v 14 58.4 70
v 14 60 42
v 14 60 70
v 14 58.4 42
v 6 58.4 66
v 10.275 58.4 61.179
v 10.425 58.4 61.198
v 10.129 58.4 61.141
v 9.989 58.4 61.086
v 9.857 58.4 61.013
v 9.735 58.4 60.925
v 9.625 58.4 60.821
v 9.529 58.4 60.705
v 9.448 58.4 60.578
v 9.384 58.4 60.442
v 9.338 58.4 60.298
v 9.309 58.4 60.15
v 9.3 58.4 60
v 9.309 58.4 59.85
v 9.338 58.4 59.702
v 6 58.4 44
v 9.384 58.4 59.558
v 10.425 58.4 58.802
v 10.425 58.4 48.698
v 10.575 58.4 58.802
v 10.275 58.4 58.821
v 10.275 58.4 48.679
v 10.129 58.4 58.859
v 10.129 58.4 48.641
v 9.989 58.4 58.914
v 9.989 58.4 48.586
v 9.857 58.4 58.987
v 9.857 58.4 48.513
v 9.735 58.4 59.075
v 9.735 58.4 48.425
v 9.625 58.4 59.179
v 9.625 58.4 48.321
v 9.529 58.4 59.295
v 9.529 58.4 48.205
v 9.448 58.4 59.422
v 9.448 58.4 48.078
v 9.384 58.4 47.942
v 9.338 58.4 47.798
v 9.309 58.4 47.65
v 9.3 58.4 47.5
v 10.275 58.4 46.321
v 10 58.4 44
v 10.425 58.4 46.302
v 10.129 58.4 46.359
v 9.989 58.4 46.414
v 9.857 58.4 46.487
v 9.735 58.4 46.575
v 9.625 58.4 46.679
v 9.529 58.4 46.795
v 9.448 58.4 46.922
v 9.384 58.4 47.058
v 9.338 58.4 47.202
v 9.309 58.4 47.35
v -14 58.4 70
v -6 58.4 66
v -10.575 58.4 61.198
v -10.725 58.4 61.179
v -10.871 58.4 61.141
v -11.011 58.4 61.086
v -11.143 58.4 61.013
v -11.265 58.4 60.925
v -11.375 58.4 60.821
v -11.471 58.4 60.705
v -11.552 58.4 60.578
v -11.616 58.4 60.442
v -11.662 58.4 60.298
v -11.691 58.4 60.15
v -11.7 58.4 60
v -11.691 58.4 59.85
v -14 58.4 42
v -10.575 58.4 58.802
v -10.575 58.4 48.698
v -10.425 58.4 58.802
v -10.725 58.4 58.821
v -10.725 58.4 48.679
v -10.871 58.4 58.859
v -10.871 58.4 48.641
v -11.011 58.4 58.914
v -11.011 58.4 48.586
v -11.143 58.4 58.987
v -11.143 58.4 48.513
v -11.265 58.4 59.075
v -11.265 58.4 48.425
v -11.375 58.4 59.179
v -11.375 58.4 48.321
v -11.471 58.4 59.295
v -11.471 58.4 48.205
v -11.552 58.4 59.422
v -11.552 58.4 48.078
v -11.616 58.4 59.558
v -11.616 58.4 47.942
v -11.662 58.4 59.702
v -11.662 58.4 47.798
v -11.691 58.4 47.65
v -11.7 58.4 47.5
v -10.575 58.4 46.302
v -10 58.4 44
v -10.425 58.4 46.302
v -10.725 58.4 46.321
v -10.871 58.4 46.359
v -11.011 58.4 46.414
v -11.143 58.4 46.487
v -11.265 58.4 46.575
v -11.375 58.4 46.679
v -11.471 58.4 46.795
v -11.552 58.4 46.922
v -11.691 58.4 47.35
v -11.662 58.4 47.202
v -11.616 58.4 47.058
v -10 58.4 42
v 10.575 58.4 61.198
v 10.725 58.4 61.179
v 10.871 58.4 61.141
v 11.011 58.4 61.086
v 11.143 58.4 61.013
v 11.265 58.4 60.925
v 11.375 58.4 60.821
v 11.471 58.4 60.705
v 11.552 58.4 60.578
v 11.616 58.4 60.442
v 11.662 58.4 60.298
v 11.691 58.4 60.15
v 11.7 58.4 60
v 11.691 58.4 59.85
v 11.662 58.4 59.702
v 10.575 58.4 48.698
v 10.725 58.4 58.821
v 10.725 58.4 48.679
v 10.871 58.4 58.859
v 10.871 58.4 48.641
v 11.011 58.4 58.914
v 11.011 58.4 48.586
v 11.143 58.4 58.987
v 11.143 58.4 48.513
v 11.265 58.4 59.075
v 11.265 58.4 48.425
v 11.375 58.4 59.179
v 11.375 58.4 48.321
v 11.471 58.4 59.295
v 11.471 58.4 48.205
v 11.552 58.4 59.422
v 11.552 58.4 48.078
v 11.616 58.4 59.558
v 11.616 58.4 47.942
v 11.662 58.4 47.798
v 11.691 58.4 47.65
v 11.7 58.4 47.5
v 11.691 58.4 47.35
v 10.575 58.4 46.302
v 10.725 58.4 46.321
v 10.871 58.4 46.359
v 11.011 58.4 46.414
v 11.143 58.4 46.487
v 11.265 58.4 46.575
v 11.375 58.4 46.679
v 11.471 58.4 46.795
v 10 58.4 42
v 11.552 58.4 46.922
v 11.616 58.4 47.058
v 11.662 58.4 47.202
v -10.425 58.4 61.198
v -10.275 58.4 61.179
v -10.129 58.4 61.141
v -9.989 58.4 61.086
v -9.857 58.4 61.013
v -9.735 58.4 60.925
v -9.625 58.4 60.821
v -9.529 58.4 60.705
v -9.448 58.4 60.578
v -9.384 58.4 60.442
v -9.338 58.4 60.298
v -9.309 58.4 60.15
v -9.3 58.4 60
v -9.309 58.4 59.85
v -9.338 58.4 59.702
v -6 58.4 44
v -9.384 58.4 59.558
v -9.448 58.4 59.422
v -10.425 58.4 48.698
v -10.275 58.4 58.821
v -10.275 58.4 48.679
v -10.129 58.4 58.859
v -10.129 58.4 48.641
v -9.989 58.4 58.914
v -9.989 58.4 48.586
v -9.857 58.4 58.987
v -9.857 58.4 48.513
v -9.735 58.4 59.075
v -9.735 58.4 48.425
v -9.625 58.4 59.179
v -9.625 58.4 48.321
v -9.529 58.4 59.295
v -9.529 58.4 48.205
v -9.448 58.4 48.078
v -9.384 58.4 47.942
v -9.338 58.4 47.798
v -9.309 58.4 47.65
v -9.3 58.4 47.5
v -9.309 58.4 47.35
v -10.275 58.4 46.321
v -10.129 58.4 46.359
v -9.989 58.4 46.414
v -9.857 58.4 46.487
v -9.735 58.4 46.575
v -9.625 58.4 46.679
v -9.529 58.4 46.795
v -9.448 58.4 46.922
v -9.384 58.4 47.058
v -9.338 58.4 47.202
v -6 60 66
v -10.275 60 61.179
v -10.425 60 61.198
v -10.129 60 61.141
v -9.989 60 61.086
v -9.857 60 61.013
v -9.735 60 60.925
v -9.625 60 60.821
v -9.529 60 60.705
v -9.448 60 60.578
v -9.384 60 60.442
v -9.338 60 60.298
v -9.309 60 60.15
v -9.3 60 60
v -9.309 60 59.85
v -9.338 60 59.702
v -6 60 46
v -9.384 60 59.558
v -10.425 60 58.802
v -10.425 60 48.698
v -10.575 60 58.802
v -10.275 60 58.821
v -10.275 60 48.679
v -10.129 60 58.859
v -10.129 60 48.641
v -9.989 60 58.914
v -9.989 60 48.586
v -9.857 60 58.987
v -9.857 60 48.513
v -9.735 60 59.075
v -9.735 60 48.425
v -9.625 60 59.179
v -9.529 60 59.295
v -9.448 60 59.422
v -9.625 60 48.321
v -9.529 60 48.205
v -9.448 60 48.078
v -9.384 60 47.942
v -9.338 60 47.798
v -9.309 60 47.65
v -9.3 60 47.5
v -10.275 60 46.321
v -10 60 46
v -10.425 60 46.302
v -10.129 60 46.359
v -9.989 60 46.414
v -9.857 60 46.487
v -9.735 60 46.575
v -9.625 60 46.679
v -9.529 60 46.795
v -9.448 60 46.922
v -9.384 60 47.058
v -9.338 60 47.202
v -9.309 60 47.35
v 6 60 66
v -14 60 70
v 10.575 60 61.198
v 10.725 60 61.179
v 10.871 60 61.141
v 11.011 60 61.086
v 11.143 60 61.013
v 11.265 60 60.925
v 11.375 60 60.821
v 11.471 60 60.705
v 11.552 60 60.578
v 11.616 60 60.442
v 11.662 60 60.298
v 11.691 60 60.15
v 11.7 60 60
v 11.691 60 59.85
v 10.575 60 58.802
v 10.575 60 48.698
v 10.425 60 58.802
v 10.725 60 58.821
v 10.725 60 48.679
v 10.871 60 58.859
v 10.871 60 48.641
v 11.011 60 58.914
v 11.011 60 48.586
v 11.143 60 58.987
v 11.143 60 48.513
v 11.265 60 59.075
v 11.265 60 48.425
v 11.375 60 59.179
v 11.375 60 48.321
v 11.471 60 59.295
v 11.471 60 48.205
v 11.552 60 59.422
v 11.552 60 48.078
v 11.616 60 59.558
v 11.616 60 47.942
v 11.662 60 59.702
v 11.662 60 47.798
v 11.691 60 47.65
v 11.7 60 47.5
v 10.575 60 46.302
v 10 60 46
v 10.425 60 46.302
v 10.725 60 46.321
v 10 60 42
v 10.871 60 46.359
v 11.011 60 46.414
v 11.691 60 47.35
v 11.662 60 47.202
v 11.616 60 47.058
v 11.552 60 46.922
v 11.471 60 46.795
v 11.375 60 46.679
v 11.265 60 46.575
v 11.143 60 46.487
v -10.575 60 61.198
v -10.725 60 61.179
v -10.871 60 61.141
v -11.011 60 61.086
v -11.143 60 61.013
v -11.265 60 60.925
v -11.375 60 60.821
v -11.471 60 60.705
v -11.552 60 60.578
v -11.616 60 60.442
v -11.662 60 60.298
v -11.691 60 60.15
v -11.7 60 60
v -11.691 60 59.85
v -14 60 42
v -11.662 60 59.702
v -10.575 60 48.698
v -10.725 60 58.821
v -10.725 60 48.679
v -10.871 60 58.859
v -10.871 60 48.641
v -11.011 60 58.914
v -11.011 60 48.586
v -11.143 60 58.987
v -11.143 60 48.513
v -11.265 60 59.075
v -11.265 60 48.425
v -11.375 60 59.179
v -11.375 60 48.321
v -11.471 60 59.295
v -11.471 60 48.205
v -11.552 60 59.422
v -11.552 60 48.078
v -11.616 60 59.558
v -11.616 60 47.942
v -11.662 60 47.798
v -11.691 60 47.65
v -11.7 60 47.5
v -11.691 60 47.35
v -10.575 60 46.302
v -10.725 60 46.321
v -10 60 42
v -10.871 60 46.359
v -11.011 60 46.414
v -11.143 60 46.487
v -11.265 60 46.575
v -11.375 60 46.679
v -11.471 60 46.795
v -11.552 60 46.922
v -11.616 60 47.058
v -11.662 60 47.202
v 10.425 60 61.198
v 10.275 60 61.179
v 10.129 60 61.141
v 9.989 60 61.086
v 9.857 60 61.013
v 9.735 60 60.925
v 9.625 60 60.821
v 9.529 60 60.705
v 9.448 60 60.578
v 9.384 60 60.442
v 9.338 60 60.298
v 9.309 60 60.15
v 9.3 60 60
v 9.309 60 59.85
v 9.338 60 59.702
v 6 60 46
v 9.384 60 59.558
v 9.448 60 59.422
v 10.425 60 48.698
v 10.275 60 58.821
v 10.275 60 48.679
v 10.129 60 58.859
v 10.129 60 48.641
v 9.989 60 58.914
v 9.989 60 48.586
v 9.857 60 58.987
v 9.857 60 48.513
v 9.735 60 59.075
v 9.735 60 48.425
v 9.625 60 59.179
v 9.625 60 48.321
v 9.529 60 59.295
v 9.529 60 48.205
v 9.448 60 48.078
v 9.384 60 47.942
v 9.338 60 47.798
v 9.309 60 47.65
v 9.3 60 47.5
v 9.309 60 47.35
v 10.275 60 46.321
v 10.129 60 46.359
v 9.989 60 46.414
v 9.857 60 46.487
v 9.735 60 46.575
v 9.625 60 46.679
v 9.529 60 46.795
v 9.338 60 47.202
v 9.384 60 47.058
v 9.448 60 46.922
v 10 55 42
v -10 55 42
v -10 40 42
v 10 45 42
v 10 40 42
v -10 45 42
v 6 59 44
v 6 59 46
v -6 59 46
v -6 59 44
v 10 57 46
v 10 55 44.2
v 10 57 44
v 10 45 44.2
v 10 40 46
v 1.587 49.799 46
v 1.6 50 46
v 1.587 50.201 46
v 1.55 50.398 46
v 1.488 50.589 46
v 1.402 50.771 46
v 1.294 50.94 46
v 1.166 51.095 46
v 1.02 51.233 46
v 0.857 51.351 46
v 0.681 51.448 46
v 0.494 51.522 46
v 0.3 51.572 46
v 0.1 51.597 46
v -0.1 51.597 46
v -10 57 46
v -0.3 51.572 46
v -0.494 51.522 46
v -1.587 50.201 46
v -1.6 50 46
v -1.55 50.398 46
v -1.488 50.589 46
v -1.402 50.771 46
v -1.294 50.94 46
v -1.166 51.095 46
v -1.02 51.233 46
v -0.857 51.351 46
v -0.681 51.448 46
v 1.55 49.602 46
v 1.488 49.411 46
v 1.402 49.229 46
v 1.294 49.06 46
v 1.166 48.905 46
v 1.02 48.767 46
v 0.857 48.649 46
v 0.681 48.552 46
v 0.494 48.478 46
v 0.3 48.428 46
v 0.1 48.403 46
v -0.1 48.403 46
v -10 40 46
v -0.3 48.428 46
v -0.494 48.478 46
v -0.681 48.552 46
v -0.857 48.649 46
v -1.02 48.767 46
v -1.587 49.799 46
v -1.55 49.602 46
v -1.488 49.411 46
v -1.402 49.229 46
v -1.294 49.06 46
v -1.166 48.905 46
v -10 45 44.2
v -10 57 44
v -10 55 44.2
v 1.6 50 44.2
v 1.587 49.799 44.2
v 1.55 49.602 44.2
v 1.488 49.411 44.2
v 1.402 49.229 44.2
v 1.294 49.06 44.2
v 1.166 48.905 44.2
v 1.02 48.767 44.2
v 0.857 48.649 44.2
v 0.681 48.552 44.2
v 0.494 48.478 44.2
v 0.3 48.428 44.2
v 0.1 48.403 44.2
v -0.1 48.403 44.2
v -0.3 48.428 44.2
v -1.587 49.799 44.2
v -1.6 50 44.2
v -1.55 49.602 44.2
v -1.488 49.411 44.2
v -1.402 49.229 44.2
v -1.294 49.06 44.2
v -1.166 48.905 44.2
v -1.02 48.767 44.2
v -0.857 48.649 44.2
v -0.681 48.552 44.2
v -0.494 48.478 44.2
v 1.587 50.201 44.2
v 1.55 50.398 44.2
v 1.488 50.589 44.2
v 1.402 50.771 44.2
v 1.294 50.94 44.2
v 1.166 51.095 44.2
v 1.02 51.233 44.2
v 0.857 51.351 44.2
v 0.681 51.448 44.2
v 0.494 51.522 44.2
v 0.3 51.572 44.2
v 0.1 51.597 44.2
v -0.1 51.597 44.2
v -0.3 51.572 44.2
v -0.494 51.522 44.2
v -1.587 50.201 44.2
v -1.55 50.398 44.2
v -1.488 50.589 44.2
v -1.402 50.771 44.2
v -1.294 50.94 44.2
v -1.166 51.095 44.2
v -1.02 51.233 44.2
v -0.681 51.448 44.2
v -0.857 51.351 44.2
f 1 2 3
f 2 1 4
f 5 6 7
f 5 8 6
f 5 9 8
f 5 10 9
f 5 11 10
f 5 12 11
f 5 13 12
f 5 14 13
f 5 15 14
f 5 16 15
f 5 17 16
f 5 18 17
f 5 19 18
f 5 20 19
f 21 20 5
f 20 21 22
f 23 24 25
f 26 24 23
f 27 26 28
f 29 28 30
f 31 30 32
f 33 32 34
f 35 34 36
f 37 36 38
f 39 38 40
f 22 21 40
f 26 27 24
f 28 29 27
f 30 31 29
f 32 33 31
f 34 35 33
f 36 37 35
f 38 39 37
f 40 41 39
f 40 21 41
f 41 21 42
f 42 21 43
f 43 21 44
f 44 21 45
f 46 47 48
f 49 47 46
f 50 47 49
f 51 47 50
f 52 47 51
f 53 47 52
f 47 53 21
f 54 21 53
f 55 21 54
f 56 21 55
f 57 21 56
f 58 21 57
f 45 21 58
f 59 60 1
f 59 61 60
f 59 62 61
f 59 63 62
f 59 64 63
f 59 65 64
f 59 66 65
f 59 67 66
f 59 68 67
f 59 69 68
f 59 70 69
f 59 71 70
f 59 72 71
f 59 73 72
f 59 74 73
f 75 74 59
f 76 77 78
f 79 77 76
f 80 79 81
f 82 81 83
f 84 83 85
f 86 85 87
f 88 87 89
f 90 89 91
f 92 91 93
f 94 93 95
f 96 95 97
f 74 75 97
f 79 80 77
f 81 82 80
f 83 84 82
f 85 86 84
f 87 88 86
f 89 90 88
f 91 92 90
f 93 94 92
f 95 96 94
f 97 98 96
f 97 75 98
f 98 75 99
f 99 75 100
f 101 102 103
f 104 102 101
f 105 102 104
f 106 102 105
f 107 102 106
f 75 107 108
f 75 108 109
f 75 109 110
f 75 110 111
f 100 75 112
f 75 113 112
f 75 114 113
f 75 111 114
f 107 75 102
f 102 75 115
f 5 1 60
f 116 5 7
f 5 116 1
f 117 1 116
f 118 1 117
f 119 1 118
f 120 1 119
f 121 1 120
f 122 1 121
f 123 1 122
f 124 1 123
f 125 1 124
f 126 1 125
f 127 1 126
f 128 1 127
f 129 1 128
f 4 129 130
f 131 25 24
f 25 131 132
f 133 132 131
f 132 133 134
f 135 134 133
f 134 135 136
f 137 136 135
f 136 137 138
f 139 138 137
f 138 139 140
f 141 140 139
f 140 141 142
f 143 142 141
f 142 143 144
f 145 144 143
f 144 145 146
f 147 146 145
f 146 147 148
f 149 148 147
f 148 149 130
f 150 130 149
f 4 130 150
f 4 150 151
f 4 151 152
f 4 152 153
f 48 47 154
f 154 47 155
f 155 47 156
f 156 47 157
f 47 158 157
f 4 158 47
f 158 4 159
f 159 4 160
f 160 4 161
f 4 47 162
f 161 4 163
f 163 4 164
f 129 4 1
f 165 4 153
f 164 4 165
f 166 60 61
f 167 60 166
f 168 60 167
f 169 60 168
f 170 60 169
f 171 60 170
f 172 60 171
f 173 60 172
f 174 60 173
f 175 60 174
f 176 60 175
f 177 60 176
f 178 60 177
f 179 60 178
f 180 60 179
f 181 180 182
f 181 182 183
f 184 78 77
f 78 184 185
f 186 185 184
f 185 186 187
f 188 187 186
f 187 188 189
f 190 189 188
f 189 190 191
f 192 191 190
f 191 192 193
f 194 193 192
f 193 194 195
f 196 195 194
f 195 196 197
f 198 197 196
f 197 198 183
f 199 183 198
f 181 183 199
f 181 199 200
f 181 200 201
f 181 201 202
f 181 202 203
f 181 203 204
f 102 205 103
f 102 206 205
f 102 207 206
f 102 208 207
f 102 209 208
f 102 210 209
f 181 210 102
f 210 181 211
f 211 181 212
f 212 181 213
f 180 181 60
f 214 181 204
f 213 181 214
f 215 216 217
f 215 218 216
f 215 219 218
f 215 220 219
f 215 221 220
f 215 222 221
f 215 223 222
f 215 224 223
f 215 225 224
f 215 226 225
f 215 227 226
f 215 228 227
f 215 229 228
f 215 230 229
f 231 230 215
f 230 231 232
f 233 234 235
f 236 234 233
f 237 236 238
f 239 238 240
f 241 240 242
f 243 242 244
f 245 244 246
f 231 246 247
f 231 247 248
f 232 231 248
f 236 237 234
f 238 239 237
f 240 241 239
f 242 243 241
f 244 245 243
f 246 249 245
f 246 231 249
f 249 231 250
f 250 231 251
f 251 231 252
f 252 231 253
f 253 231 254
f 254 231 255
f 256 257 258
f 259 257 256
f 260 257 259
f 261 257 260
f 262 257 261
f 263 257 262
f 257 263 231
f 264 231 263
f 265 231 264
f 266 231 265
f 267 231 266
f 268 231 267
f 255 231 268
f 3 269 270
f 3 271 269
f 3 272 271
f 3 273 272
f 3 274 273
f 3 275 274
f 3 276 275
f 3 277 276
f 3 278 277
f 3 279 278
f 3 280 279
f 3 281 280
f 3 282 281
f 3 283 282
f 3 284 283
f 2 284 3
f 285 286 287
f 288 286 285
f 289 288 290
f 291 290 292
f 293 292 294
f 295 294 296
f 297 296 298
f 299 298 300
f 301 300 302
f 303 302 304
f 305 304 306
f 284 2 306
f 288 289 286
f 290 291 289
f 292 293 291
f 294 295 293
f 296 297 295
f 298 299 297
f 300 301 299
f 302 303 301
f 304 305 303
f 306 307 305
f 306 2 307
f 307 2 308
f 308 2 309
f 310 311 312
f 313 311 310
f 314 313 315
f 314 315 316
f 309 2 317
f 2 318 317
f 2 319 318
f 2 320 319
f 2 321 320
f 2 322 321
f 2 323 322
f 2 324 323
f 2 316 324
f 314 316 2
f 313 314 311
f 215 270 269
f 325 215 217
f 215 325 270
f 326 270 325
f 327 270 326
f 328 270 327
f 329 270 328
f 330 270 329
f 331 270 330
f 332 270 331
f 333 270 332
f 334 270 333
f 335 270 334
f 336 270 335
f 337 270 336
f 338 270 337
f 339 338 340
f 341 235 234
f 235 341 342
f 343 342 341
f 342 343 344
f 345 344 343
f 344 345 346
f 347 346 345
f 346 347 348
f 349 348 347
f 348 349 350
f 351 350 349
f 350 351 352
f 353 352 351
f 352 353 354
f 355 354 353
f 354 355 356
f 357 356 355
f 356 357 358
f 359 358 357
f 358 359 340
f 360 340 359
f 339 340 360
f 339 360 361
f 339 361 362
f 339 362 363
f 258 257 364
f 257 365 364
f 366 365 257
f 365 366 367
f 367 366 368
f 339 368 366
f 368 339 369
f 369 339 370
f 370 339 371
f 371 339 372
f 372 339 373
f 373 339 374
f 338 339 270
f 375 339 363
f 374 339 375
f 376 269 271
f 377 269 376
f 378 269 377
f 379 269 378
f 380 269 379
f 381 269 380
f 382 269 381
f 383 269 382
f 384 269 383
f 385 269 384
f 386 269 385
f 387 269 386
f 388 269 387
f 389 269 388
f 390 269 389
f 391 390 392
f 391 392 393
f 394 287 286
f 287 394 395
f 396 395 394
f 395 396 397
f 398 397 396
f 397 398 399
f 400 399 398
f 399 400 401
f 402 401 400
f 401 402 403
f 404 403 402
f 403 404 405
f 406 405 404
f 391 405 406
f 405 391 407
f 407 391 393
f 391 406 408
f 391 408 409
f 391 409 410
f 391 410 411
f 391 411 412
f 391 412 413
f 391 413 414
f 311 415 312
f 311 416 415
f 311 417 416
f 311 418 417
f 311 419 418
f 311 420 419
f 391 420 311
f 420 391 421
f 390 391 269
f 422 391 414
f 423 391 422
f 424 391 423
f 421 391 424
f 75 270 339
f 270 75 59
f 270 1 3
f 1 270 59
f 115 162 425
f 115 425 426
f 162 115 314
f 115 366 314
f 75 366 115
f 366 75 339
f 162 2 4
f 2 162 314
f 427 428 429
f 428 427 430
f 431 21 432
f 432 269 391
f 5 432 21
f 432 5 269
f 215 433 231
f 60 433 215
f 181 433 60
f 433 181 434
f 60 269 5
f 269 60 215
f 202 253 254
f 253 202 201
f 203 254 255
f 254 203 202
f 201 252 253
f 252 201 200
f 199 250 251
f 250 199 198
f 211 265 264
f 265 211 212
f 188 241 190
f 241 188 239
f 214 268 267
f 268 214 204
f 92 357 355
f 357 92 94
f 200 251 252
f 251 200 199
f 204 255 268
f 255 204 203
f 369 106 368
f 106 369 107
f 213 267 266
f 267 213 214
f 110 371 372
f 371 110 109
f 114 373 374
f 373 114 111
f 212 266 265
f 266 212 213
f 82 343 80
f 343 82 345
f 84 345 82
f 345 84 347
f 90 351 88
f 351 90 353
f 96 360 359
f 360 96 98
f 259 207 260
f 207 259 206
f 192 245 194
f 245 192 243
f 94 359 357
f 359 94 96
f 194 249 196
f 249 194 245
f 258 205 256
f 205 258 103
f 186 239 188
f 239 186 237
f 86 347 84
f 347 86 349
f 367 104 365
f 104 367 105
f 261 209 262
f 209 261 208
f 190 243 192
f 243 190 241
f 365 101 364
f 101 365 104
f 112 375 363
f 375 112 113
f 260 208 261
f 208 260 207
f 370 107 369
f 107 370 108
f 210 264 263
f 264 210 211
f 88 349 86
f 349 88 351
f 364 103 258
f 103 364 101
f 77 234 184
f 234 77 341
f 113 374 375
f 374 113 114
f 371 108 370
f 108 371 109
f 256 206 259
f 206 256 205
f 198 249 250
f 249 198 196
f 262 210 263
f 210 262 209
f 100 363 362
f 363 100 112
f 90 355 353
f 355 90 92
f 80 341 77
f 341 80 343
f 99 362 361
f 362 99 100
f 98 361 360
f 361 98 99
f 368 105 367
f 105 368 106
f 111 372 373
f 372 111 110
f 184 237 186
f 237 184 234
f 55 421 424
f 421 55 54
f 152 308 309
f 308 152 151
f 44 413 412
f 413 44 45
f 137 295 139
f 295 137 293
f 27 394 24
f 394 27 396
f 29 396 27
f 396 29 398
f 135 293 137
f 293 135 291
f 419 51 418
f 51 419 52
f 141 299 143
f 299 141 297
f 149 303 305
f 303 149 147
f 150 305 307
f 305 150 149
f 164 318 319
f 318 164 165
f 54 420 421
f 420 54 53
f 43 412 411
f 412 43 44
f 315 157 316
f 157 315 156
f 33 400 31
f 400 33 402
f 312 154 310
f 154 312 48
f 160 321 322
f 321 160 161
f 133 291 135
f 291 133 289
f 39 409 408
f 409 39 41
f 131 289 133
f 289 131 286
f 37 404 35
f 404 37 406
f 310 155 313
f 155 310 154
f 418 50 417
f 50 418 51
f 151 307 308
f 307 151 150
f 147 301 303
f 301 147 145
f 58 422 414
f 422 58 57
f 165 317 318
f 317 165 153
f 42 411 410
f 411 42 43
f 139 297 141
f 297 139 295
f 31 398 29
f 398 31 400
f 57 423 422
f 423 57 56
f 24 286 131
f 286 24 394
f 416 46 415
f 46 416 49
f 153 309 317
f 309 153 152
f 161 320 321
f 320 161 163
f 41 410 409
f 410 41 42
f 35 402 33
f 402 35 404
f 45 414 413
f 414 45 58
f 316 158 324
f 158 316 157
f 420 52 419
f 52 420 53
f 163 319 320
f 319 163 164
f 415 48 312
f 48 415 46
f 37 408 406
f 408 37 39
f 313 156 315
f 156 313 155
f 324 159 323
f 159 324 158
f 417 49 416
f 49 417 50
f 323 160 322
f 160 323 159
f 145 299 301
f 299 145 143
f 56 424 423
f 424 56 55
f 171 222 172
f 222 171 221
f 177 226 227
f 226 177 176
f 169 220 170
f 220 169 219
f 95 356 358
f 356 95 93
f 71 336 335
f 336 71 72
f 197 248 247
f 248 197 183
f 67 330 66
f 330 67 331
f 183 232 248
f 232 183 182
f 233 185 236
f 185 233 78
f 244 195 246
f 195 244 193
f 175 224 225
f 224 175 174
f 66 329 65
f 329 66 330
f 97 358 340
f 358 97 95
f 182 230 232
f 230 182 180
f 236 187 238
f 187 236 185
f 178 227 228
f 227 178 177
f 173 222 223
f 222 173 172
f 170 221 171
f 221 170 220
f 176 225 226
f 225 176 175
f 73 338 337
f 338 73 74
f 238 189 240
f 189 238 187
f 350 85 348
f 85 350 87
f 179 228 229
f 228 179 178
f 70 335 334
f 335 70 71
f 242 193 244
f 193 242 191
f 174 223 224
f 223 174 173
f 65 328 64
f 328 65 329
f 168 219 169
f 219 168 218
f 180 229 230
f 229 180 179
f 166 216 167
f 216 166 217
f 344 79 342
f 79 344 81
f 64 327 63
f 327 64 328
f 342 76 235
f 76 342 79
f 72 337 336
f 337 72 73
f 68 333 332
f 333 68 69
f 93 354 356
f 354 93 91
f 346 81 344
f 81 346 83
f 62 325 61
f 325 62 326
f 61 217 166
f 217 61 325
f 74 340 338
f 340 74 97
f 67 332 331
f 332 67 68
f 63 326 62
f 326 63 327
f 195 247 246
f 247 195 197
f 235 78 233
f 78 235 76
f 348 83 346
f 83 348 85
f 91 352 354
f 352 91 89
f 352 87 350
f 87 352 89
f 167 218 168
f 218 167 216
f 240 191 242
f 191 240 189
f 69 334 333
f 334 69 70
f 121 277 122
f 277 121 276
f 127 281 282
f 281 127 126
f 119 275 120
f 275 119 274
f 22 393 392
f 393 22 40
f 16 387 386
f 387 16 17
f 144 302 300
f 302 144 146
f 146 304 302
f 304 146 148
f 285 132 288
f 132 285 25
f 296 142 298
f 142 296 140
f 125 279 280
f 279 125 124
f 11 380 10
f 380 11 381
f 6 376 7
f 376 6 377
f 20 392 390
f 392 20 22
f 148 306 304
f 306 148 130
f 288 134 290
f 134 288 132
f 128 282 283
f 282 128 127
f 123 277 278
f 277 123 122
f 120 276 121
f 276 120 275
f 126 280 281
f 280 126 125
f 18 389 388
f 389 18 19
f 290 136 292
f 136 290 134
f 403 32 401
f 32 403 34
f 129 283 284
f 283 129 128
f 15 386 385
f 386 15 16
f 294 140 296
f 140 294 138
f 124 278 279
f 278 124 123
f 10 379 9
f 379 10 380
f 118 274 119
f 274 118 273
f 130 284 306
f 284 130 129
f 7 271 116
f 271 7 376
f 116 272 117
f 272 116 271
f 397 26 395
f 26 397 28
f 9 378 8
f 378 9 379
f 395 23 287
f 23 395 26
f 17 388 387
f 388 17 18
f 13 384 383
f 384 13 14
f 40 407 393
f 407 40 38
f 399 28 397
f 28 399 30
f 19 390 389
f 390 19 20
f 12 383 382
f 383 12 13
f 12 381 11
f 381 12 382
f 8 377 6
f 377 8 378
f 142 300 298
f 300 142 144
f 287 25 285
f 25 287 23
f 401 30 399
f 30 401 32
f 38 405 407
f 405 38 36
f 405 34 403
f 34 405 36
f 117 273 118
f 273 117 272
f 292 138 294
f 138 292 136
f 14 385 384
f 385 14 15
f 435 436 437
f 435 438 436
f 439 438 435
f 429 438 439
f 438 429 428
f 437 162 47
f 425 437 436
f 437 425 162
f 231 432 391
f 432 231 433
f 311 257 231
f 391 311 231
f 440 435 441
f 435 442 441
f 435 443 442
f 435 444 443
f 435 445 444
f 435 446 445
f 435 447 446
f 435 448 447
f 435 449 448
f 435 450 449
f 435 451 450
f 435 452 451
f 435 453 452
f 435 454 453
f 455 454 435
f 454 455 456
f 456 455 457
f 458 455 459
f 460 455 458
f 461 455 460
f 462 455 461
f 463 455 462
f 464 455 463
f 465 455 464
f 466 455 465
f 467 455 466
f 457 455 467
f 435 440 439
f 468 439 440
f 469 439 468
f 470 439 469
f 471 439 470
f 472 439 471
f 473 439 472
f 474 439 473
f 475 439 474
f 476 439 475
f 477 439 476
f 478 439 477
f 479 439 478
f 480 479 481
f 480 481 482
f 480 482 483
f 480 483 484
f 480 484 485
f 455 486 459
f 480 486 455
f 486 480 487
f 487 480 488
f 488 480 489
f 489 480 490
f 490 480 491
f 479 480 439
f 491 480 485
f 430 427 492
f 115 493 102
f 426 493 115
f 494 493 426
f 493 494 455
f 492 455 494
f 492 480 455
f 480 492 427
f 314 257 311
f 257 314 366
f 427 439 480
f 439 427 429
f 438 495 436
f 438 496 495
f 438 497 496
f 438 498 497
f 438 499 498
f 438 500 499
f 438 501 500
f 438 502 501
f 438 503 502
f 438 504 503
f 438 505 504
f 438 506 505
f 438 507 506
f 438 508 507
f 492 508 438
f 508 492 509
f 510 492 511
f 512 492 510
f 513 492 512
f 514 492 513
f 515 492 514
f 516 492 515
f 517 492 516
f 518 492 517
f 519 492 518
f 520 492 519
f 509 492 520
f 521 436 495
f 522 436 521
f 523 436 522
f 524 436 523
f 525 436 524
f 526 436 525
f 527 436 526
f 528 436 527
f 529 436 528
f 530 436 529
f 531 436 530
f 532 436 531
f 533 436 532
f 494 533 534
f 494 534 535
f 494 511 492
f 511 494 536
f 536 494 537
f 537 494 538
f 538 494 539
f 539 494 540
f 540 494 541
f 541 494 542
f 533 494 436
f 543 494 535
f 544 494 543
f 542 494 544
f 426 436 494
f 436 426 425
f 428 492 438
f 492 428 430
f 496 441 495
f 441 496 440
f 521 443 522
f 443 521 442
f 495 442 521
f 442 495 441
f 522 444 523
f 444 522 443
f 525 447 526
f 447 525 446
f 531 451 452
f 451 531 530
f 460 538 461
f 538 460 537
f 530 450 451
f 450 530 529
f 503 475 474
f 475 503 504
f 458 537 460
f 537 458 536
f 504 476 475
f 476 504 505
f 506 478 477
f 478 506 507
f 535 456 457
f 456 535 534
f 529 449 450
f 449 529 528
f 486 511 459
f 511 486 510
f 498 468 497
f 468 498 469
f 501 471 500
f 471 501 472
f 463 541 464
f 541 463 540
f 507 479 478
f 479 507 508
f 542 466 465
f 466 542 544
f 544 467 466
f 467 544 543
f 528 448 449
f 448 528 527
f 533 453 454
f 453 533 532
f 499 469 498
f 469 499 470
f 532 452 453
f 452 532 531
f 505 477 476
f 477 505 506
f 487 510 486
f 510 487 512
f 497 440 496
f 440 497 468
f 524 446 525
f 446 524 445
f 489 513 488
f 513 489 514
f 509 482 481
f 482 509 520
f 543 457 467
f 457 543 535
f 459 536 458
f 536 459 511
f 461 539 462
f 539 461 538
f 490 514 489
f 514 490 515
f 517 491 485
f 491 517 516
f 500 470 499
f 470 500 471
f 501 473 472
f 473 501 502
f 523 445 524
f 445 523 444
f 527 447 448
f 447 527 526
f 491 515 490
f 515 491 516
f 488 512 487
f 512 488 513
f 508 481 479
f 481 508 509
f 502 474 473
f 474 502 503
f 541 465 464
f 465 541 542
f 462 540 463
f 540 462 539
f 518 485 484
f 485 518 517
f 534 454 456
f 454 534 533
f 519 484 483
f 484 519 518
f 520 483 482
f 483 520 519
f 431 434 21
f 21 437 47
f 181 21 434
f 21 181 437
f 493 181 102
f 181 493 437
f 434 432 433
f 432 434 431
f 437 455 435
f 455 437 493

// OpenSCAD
module screwhelper(rout, rin, height)
{
    difference(){
        translate([0,0,height/2])cylinder(height, r=rout,center=true,$fn=50);
        translate([0,0,height/2])cylinder(height+0.01, r=rin,center=true,$fn=50);
    }
}

module conn40_one(){
    /*
    difference(){
    translate([0, 0, 0])screwhelper(5, 1.6, 40-4);
    translate([0, 0, 40-4-1])cylinder(2.01, r=4,center=true,$fn=50);
    translate([0, 0, 1])cylinder(2.01, r=4,center=true,$fn=50);
    }
    */
    
    translate([0, 0, 36-2])screwhelper(5, 4, 2);
    difference(){
        hull(){
        translate([0, 0, 36-2])cylinder(0.01, r=5,center=true,$fn=50);
        translate([0, 0, 36-4])cylinder(0.01, r=3,center=true,$fn=50);
        }
        cylinder(99, r=1.6,center=true,$fn=50);
    }
    
    translate([0, 0, 4])screwhelper(3, 1.6, 36-8);
    
    difference(){
        hull(){
        translate([0, 0, 4])cylinder(0.01, r=3,center=true,$fn=50);
        translate([0, 0, 2])cylinder(0.01, r=5,center=true,$fn=50);
        }
        cylinder(99, r=1.6,center=true,$fn=50);
    }
    translate([0, 0, 0])screwhelper(5, 4, 2);
}

module conn40(){
    translate([ 35, 35, 2])conn40_one();
    translate([-35, 35, 2])conn40_one();
    translate([ 35,-35, 2])conn40_one();
    translate([-35,-35, 2])conn40_one();
}


module cam(){
difference(){
    cube([28,28,1.6],center=true);
    //middle
    translate([0,-2,0])cube([12,24,10],center=true);
    //edge
    //translate([-15,15,0])cube([10,4,10],center=true);
    //translate([ 15,15,0])cube([10,4,10],center=true);
    //hole
    translate([-21/2,4-12.5,0])cylinder(110, r=1.2,center=true,$fn=50);
    translate([ 21/2,4-12.5,0])cylinder(110, r=1.2,center=true,$fn=50);
    translate([-21/2, 4,0])cylinder(110, r=1.2,center=true,$fn=50);
    translate([ 21/2, 4,0])cylinder(110, r=1.2,center=true,$fn=50);
}
}
module cam_bottom(){
    difference(){
        translate([0,50,42+2])cube([20,20,4],center=true);
        translate([0,50,42+1.1])cube([50,10,2.2],center=true);
        translate([0,50,0.5])cylinder(100, r=1.6,center=true,$fn=50);
        translate([0,58,42+3])cube([100,2,2],center=true);
    }
}
module cam_beside(){
    translate([0,60-0.8,56])rotate([90,0,0])cam();
    cam_bottom();
}

module spk_ontv(){
    difference(){
        translate([0,0, 10])cube([48, 24, 20],center=true);
        //mid
        translate([0,0, 12])cube([45, 21, 20],center=true);
        //y
        translate([-10,0, 10])rotate([90,0,0])cylinder(99, r=8,center=true,$fn=50);
        translate([ 10,0, 10])rotate([90,0,0])cylinder(99, r=8,center=true,$fn=50);
        //x
        translate([0,0, 12])cube([55, 15, 20],center=true);
    }

    //
    difference(){
        hull(){
        translate([0,0,  0])cube([48,20,0.01],center=true);
        translate([0,0,-10+0.01])cube([48,14,0.01],center=true);
        }
        translate([0,0,-5])cube([99,13,10],center=true);
    }
}

module top(){
    //+35
    translate([ 35,  35, 2])screwhelper(4, 1.6, 2);
    translate([-35,  35, 2])screwhelper(4, 1.6, 2);
    translate([ 35, -35, 2])screwhelper(4, 1.6, 2);
    translate([-35, -35, 2])screwhelper(4, 1.6, 2);

    //+29
    translate([-0+29,  24.5   ,2])screwhelper(4, 1.6, 2);
    difference(){
    translate([-0+29,  24.5-23,2])screwhelper(4, 1.6, 2);
    translate([-0+29, -24.5+23,2])cylinder(11.01, r=1.6,center=true,$fn=50);
    }
    difference(){
    translate([-0+29, -24.5+23,2])screwhelper(4, 1.6, 2);
    translate([-0+29,  24.5-23,2])cylinder(11.01, r=1.6,center=true,$fn=50);
    }
    translate([-0+29, -24.5,   2])screwhelper(4, 1.6, 2);

    //-29
    translate([-0-29,  24.5,   2])screwhelper(4, 1.6, 2);
    difference(){
    translate([-0-29,  24.5-23,2])screwhelper(4, 1.6, 2);
    translate([-0-29, -24.5+23,2])cylinder(11.01, r=1.6,center=true,$fn=50);
    }
    difference(){
    translate([-0-29, -24.5+23,2])screwhelper(4, 1.6, 2);
    translate([-0-29,  24.5-23,2])cylinder(11.01, r=1.6,center=true,$fn=50);
    }
    translate([-0-29, -24.5,   2])screwhelper(4, 1.6, 2);

    //board
    difference(){
    union(){
    //pi5
    translate([0, 0, 1])cube([80, 80, 2],center=true);
    //cam
    translate([-30, 50, 3])cube([9.9, 9.9, 2],center=true);
    translate([-30, 50, 1])cube([20, 20, 2],center=true);
    translate([ 30, 50, 3])cube([9.9, 9.9, 2],center=true);
    translate([ 30, 50, 1])cube([20, 20, 2],center=true);
    }

    //-center
    translate([ 30, 0, 0])cylinder(99, r=1.6,center=true,$fn=50);
    translate([ 20, 0, 0])cylinder(99, r=1.6,center=true,$fn=50);
    translate([ 10, 0, 0])cylinder(99, r=1.6,center=true,$fn=50);
    translate([  0, 0, 0])cylinder(99, r=1.6,center=true,$fn=50);
    translate([-10, 0, 0])cylinder(99, r=1.6,center=true,$fn=50);
    translate([-20, 0, 0])cylinder(99, r=1.6,center=true,$fn=50);
    translate([-30, 0, 0])cylinder(99, r=1.6,center=true,$fn=50);

    //hole @ cam
    translate([ 30, 50, 0])cylinder(99, r=1.6,center=true,$fn=50);
    translate([-30, 50, 0])cylinder(99, r=1.6,center=true,$fn=50);
    translate([ 30, 50, 1])cylinder(2.01, r=3,center=true,$fn=50);
    translate([-30, 50, 1])cylinder(2.01, r=3,center=true,$fn=50);

    //hole @ 35
    translate([ 35, 35, 0])cylinder(99, r=3.0,center=true,$fn=50);
    translate([-35, 35, 0])cylinder(99, r=3.0,center=true,$fn=50);
    translate([ 35,-35, 0])cylinder(99, r=3.0,center=true,$fn=50);
    translate([-35,-35, 0])cylinder(99, r=3.0,center=true,$fn=50);

    //-rpi3 hole
    translate([0+29, 24.5, 0])cylinder(1000, r=3.0,center=true,$fn=50);
    translate([0+29,-24.5, 0])cylinder(1000, r=3.0,center=true,$fn=50);
    translate([0-29, 24.5, 0])cylinder(1000, r=3.0,center=true,$fn=50);
    translate([0-29,-24.5, 0])cylinder(1000, r=3.0,center=true,$fn=50);

    //-rpizero hole
    translate([0+29, 24.5-23, 0])cylinder(1000, r=3.0,center=true,$fn=50);
    translate([0-29, 24.5-23, 0])cylinder(1000, r=3.0,center=true,$fn=50);
    translate([0+29,-24.5+23, 0])cylinder(1000, r=3.0,center=true,$fn=50);
    translate([0-29,-24.5+23, 0])cylinder(1000, r=3.0,center=true,$fn=50);

    //-rpi 40pin
    translate([0, 49/2, 0])cube([52-0.4,5.8,99],center=true);
    translate([0,-49/2, 0])cube([52-0.4,5.8,99],center=true);

    //-rpizero 40pin
    translate([0, 49/2-23, 0])cube([52-0.4,5.8,99],center=true);
    translate([0,-49/2+23, 0])cube([52-0.4,5.8,99],center=true);

    }//difference
}

module bot(){
    //+35
    translate([ 35,  35, 2])screwhelper(4, 1.6, 2);
    translate([-35,  35, 2])screwhelper(4, 1.6, 2);
    translate([ 35, -35, 2])screwhelper(4, 1.6, 2);
    translate([-35, -35, 2])screwhelper(4, 1.6, 2);

    //board
    difference(){
    union(){
    translate([0, 0, 1])cube([80, 80, 2],center=true);
    }
/*
    //-near far hole
    for(y=[-40:10:40]){
    for(x=[-40:10:40]){
        translate([x,y,0])cylinder(1000, r=1.6,center=true,$fn=50);
    }
    }
*/
    //hole @ 35
    translate([ 35, 35, 0])cylinder(99, r=3.0,center=true,$fn=50);
    translate([-35, 35, 0])cylinder(99, r=3.0,center=true,$fn=50);
    translate([ 35,-35, 0])cylinder(99, r=3.0,center=true,$fn=50);
    translate([-35,-35, 0])cylinder(99, r=3.0,center=true,$fn=50);
    }

    difference(){
        hull(){
        translate([0,0,  0])cube([80,20,0.01],center=true);
        translate([0,0,-10+0.01])cube([80,14,0.01],center=true);
        }
        translate([0,0,-5])cube([99,13,10],center=true);
    }
}

/*
translate([0,0,40])rotate([0,180,0])top();
conn40();
bot();
*/

cam_beside();
//spk_ontv();
//conn40_one();
//top();
//bot();
